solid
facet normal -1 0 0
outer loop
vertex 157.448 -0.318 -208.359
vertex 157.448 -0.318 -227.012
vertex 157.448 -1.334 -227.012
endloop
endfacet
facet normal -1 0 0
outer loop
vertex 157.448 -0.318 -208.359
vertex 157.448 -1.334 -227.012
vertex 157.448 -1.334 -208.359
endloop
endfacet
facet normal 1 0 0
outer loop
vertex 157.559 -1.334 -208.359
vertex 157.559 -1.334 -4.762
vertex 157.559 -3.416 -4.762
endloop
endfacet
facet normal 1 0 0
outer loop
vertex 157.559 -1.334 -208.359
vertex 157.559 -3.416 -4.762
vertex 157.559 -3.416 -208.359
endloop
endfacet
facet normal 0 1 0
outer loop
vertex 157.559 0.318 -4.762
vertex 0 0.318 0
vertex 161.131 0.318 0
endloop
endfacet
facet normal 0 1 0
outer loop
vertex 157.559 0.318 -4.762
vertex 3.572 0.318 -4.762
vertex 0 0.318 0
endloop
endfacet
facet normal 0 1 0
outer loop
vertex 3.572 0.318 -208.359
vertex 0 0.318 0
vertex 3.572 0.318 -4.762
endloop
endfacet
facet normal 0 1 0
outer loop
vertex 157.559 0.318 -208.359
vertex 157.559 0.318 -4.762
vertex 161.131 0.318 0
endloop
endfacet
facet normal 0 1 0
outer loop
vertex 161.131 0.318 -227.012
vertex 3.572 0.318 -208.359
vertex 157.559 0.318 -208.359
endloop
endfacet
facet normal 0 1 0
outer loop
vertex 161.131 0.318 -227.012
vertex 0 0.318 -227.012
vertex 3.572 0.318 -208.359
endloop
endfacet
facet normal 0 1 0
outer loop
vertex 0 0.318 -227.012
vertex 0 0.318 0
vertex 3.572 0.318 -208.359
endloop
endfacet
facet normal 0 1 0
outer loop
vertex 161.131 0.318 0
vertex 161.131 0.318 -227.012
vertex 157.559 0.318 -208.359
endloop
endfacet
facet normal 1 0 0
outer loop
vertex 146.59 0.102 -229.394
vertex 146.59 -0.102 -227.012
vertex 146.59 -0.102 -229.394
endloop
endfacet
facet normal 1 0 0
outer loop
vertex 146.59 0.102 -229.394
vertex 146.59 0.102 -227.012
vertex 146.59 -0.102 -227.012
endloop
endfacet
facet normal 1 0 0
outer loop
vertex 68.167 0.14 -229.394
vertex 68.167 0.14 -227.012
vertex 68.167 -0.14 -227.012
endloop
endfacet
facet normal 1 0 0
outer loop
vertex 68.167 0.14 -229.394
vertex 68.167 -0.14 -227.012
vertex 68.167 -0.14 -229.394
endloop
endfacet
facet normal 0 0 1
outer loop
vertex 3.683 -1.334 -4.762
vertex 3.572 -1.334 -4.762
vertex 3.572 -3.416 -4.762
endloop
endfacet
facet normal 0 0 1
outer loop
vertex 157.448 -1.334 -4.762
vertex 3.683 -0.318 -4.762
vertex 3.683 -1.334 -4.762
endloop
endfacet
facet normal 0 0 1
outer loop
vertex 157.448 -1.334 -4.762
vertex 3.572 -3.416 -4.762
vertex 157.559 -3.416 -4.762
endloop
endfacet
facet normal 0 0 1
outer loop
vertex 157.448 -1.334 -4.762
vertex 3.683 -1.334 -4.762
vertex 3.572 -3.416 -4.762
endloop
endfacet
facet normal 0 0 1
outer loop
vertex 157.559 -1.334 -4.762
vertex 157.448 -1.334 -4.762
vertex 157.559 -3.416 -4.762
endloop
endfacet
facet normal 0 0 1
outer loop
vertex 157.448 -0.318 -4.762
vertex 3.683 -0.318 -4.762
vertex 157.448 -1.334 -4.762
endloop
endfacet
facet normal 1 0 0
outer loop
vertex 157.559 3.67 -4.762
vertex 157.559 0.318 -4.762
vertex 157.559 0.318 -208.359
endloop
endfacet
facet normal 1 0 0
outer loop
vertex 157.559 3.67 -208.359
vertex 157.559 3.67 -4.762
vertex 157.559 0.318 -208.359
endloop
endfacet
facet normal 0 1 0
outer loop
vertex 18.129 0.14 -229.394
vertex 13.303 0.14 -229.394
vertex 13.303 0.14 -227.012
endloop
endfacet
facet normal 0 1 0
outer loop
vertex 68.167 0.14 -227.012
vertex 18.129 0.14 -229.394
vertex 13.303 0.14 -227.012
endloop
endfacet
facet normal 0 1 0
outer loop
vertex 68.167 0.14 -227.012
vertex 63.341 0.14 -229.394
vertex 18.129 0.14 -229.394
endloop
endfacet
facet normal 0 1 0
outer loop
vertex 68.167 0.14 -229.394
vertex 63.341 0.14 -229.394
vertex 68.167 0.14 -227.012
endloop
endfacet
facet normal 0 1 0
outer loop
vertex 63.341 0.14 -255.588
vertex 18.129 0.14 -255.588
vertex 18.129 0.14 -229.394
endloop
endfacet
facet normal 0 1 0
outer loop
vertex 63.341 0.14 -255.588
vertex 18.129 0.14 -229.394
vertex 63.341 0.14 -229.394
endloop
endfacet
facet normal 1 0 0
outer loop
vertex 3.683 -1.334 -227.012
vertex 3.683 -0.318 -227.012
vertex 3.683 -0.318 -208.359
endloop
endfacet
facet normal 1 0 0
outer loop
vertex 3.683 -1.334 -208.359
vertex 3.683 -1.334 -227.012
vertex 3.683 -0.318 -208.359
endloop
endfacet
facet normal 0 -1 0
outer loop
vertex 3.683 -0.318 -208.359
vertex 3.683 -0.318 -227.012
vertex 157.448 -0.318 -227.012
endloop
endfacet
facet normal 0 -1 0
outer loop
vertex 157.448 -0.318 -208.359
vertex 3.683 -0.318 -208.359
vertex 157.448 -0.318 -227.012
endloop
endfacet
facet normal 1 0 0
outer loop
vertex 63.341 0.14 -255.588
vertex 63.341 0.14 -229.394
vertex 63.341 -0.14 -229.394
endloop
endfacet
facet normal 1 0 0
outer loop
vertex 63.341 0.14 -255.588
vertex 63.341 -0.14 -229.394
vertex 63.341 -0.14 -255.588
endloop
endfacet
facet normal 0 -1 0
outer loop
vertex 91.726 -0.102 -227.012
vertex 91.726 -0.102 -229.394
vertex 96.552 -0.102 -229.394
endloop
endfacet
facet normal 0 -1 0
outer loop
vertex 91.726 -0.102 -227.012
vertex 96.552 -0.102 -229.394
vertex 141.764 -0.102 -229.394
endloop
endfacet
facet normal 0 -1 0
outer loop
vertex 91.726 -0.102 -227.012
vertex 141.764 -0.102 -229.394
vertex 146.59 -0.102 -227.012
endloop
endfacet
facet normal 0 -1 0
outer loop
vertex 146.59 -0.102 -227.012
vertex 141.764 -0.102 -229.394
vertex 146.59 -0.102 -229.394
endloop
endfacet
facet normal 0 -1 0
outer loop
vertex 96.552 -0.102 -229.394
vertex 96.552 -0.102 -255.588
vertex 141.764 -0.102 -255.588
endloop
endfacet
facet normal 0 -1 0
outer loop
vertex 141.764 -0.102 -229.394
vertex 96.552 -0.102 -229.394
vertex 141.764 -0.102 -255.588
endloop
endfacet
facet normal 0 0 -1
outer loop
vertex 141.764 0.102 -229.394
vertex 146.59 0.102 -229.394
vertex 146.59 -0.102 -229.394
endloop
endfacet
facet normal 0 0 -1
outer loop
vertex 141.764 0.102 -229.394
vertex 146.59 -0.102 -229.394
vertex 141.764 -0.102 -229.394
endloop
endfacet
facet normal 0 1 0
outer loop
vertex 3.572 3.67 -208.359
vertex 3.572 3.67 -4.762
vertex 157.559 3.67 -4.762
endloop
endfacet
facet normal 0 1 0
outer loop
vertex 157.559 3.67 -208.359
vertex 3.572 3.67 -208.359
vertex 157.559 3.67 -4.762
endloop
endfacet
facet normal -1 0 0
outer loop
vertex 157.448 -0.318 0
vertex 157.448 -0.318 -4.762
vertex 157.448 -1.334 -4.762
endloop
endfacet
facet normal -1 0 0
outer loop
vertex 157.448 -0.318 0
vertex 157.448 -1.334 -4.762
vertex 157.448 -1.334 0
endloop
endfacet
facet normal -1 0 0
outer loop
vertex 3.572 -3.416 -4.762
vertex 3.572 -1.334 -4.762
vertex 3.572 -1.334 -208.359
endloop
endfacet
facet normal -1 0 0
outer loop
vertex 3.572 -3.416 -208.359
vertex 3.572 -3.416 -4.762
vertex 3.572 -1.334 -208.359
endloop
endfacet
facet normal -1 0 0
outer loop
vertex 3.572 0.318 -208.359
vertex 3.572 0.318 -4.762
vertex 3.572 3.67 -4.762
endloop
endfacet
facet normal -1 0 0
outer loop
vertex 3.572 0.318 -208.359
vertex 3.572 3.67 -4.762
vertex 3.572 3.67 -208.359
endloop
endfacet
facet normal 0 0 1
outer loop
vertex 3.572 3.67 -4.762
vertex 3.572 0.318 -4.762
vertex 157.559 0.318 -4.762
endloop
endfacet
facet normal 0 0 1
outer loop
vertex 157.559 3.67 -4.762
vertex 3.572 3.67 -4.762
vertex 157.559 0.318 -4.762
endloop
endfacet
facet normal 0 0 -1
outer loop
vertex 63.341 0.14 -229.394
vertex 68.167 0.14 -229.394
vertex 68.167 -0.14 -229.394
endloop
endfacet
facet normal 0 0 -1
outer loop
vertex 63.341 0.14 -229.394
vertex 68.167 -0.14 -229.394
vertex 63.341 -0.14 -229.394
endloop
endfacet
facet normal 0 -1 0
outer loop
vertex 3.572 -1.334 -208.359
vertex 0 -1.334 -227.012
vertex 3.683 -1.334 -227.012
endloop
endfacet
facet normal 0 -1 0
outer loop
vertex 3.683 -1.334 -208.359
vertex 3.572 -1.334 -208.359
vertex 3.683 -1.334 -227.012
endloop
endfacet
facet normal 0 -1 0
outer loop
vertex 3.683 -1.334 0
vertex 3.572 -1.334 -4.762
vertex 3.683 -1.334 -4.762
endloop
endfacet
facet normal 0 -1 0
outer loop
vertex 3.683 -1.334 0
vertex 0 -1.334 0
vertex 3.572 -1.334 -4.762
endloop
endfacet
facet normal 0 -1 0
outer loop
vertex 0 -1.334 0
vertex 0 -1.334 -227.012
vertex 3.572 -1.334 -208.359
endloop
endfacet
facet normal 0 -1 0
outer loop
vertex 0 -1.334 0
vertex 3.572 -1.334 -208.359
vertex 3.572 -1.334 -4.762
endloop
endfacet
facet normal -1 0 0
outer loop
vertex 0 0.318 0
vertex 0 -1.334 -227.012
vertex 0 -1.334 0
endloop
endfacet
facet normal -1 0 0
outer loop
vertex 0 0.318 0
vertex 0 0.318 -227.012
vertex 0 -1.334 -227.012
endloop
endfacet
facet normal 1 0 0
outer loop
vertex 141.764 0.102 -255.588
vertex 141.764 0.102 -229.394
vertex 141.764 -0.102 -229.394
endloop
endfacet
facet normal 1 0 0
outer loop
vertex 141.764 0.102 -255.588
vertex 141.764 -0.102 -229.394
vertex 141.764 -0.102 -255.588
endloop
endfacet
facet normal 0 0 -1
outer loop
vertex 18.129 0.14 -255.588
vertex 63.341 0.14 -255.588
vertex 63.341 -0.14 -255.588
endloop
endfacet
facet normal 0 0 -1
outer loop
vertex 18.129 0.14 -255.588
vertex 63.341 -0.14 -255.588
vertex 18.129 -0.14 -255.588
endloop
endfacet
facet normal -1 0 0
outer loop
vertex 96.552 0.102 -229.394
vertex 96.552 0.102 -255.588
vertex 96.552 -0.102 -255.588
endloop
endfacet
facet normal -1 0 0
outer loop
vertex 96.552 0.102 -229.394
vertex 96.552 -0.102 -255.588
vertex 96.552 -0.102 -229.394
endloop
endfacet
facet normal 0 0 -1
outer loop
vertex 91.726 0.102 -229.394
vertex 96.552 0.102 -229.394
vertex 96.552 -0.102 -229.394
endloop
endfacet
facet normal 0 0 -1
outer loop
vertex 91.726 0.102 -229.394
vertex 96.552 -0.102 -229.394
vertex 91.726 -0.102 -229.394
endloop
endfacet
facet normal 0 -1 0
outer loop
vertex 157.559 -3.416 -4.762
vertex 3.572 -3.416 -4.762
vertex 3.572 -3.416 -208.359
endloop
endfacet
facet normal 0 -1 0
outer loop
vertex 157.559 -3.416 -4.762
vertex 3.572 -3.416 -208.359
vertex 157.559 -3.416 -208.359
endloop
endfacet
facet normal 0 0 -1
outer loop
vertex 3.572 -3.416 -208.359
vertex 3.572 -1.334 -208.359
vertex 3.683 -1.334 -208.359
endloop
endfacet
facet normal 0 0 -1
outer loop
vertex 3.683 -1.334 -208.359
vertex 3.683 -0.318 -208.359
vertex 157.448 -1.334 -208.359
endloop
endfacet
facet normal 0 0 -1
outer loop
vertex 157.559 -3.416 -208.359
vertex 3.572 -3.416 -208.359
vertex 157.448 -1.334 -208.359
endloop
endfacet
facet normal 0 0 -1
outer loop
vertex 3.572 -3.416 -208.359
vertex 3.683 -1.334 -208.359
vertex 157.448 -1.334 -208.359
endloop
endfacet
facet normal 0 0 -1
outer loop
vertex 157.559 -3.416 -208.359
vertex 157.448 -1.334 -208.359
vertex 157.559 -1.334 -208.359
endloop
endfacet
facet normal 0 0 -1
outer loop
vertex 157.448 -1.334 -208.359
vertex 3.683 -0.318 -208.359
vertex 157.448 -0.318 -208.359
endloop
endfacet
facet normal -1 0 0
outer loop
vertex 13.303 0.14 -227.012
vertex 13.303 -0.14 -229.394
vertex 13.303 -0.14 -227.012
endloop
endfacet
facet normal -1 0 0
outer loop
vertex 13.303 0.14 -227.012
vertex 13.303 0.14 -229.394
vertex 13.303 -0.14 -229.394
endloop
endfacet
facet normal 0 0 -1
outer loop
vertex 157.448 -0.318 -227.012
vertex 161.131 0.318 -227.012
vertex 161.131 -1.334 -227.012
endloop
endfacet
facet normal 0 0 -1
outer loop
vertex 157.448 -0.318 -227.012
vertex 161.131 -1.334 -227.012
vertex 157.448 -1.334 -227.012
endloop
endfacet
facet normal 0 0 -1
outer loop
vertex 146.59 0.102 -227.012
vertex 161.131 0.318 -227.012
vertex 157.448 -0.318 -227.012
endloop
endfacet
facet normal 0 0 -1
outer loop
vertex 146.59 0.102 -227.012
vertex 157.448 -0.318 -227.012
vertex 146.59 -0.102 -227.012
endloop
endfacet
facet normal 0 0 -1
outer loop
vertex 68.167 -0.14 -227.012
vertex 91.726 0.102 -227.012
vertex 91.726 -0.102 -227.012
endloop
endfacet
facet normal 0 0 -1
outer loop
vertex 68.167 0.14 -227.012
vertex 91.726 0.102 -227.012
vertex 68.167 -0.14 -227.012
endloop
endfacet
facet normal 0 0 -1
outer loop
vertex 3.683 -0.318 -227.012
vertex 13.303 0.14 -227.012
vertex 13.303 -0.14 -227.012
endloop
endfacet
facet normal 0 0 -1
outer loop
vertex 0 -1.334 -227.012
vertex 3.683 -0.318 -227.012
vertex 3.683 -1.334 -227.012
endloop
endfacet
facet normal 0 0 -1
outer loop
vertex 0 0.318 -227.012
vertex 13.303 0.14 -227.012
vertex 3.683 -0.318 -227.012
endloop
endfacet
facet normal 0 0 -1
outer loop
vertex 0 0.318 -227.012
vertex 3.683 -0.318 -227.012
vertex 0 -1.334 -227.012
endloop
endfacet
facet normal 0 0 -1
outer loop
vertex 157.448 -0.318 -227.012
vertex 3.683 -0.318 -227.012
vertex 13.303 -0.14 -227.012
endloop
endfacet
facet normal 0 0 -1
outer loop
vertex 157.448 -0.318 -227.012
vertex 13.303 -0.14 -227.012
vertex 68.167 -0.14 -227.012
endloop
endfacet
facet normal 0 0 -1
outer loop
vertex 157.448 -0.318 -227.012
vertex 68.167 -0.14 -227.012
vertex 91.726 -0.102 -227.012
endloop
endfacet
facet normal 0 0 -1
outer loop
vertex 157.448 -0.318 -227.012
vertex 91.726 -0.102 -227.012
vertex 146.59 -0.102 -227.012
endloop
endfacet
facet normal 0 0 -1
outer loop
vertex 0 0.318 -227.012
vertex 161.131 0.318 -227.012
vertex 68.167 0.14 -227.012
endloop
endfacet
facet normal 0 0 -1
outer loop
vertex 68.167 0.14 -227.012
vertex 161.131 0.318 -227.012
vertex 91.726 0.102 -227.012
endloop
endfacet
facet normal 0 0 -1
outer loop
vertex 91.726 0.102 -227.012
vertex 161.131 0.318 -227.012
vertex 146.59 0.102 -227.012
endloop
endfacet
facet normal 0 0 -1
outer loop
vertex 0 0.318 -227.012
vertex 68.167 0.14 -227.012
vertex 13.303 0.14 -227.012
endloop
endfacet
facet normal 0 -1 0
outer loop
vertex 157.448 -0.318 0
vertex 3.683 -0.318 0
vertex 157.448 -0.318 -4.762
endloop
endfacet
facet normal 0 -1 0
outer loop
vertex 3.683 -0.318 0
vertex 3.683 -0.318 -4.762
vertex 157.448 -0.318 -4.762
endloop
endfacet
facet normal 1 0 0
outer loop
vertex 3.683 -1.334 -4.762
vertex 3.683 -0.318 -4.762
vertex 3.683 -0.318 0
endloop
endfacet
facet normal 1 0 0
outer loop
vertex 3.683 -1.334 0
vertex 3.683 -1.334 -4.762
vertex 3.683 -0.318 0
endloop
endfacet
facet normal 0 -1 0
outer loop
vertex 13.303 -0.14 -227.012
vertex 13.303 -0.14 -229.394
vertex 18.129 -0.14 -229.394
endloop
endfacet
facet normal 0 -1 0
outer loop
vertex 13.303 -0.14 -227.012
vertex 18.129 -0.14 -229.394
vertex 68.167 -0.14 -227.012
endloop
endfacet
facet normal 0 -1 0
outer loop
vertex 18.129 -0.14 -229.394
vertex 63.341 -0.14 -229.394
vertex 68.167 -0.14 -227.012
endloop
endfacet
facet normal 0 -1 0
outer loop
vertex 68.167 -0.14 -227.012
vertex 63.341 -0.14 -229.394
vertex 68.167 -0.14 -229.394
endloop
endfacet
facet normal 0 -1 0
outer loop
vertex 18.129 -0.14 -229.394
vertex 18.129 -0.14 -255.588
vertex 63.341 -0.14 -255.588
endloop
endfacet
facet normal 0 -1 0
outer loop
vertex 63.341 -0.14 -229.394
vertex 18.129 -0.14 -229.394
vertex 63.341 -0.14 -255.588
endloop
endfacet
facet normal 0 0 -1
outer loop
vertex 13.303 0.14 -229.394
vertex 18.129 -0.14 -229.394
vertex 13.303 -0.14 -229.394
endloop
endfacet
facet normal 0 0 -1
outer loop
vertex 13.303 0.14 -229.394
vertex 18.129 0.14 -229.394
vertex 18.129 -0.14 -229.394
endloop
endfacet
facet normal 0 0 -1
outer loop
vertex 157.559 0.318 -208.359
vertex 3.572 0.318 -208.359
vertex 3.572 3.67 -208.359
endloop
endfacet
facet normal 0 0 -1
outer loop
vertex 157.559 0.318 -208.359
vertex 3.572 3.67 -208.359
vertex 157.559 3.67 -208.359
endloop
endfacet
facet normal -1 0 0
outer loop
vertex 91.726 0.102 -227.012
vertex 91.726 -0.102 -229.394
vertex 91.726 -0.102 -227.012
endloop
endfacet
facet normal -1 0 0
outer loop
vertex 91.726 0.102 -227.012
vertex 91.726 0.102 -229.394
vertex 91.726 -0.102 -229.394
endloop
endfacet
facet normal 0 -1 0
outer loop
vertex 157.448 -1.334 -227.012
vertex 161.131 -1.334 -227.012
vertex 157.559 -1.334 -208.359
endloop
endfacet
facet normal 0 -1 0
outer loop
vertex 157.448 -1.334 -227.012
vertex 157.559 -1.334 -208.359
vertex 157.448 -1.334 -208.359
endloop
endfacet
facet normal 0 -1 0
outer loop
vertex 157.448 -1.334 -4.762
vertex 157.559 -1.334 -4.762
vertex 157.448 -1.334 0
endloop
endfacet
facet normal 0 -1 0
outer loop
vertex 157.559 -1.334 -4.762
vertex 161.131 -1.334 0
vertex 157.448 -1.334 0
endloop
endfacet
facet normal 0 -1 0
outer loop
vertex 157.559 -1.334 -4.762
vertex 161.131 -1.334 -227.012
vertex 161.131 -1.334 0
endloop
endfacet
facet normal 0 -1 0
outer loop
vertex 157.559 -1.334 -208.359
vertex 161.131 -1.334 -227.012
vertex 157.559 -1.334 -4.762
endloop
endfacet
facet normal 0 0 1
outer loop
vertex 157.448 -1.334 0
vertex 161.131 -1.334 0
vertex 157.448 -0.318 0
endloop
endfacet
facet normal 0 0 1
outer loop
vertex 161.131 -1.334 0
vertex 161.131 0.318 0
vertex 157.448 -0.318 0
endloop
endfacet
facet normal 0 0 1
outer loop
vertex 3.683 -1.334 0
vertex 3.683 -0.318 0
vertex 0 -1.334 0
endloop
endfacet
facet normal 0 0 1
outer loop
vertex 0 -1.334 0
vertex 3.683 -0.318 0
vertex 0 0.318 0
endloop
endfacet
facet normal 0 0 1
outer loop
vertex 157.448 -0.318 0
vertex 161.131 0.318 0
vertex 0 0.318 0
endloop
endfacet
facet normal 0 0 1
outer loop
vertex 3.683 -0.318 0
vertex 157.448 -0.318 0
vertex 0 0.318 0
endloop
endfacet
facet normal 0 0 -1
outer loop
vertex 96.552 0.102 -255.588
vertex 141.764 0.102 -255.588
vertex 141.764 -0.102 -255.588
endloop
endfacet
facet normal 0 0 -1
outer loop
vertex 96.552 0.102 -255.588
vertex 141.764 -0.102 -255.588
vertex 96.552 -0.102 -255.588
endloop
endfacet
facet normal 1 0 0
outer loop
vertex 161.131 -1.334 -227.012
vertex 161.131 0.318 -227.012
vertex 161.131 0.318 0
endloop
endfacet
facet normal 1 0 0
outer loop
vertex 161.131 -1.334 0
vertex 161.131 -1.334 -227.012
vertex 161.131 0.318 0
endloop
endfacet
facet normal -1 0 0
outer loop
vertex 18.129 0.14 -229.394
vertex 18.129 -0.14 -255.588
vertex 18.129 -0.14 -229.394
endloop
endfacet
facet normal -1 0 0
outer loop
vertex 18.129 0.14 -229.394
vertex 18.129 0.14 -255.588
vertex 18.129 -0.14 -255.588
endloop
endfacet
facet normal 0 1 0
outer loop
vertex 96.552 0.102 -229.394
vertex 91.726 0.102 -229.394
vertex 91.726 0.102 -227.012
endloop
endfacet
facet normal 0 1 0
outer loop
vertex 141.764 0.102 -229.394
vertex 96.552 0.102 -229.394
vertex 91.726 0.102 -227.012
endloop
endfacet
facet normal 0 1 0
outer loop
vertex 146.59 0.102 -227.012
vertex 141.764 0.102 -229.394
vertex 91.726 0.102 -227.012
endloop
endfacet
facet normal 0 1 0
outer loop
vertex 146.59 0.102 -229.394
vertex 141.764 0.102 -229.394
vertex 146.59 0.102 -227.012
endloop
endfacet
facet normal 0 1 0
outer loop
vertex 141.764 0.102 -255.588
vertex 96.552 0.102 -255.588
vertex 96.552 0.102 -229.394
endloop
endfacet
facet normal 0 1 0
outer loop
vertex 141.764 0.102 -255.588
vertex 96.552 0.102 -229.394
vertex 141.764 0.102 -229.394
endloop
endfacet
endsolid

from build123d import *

# Parameters (mm, degrees)
SKETCH1_W             = 153.9875
SKETCH1_H             = 203.596875
CELL_INSULATION_DEPTH = 0.3175
CELL_BODY_DEPTH       = 3.6703
CELL_BODY_DEPTH_BACK  = 3.4163
SKETCH1_3_W           = 153.9875
SKETCH1_3_H           = 203.596875
ANODE_TAB_DEPTH       = 0.1016
CATHODE_TAB_DEPTH     = 0.1397
SKETCH2_W             = 3.683
SKETCH2_H             = 227.0125
EDGE_FOLD_DEPTH       = 1.016


with BuildPart() as part:
    # Sketch1 → Cell Insulation (new, symmetric)
    with BuildSketch(Plane(origin=(0, 0, 0), x_dir=(1, 0, 0), z_dir=(0, 1, 0))):
        Polygon((0, 227.0125), (0, 0), (161.13125, 0), (161.13125, 227.0125), (146.58975, 227.0125), (141.76375, 227.0125), (96.55175, 227.0125), (91.72575, 227.0125), (68.16725, 227.0125), (63.34125, 227.0125), (18.12925, 227.0125), (13.30325, 227.0125), align=None)
        with Locations((80.565625, 106.5609375)):
            Rectangle(SKETCH1_W, SKETCH1_H, mode=Mode.SUBTRACT)
    extrude(amount=CELL_INSULATION_DEPTH, both=True)

    # Sketch1<3> → Cell Body (add, two sides: drawn at the far end of the back side and taken through both)
    with BuildSketch(Plane(origin=(0, 0, 0), x_dir=(1, 0, 0), z_dir=(0, 1, 0)).offset(-CELL_BODY_DEPTH_BACK)):
        with Locations((80.565625, 106.5609375)):
            Rectangle(SKETCH1_3_W, SKETCH1_3_H)
    extrude(amount=CELL_BODY_DEPTH + CELL_BODY_DEPTH_BACK)

    # Sketch1<4> → Anode Tab (add, symmetric)
    with BuildSketch(Plane(origin=(0, 0, 0), x_dir=(1, 0, 0), z_dir=(0, 1, 0))):
        Polygon((146.58975, 227.0125), (146.58975, 229.39375), (141.76375, 229.39375), (141.76375, 255.5875), (96.55175, 255.5875), (96.55175, 229.39375), (91.72575, 229.39375), (91.72575, 227.0125), align=None)
    extrude(amount=ANODE_TAB_DEPTH, both=True)

    # Sketch1<5> → Cathode Tab (add, symmetric)
    with BuildSketch(Plane(origin=(0, 0, 0), x_dir=(1, 0, 0), z_dir=(0, 1, 0))):
        Polygon((13.30325, 229.39375), (13.30325, 227.0125), (68.16725, 227.0125), (68.16725, 229.39375), (63.34125, 229.39375), (63.34125, 255.5875), (18.12925, 255.5875), (18.12925, 229.39375), align=None)
    extrude(amount=CATHODE_TAB_DEPTH, both=True)

    # Sketch2 → Edge Fold (add)
    with BuildSketch(Plane.XZ.offset(0.3175)):
        with Locations((1.8415, -113.50625)):
            Rectangle(SKETCH2_W, SKETCH2_H)
    edge_fold = extrude(amount=EDGE_FOLD_DEPTH)

    # Edge Folds Mirror: Edge Fold across plane
    add(edge_fold.mirror(Plane.ZY.offset(-80.565625)))


solid = part.part
